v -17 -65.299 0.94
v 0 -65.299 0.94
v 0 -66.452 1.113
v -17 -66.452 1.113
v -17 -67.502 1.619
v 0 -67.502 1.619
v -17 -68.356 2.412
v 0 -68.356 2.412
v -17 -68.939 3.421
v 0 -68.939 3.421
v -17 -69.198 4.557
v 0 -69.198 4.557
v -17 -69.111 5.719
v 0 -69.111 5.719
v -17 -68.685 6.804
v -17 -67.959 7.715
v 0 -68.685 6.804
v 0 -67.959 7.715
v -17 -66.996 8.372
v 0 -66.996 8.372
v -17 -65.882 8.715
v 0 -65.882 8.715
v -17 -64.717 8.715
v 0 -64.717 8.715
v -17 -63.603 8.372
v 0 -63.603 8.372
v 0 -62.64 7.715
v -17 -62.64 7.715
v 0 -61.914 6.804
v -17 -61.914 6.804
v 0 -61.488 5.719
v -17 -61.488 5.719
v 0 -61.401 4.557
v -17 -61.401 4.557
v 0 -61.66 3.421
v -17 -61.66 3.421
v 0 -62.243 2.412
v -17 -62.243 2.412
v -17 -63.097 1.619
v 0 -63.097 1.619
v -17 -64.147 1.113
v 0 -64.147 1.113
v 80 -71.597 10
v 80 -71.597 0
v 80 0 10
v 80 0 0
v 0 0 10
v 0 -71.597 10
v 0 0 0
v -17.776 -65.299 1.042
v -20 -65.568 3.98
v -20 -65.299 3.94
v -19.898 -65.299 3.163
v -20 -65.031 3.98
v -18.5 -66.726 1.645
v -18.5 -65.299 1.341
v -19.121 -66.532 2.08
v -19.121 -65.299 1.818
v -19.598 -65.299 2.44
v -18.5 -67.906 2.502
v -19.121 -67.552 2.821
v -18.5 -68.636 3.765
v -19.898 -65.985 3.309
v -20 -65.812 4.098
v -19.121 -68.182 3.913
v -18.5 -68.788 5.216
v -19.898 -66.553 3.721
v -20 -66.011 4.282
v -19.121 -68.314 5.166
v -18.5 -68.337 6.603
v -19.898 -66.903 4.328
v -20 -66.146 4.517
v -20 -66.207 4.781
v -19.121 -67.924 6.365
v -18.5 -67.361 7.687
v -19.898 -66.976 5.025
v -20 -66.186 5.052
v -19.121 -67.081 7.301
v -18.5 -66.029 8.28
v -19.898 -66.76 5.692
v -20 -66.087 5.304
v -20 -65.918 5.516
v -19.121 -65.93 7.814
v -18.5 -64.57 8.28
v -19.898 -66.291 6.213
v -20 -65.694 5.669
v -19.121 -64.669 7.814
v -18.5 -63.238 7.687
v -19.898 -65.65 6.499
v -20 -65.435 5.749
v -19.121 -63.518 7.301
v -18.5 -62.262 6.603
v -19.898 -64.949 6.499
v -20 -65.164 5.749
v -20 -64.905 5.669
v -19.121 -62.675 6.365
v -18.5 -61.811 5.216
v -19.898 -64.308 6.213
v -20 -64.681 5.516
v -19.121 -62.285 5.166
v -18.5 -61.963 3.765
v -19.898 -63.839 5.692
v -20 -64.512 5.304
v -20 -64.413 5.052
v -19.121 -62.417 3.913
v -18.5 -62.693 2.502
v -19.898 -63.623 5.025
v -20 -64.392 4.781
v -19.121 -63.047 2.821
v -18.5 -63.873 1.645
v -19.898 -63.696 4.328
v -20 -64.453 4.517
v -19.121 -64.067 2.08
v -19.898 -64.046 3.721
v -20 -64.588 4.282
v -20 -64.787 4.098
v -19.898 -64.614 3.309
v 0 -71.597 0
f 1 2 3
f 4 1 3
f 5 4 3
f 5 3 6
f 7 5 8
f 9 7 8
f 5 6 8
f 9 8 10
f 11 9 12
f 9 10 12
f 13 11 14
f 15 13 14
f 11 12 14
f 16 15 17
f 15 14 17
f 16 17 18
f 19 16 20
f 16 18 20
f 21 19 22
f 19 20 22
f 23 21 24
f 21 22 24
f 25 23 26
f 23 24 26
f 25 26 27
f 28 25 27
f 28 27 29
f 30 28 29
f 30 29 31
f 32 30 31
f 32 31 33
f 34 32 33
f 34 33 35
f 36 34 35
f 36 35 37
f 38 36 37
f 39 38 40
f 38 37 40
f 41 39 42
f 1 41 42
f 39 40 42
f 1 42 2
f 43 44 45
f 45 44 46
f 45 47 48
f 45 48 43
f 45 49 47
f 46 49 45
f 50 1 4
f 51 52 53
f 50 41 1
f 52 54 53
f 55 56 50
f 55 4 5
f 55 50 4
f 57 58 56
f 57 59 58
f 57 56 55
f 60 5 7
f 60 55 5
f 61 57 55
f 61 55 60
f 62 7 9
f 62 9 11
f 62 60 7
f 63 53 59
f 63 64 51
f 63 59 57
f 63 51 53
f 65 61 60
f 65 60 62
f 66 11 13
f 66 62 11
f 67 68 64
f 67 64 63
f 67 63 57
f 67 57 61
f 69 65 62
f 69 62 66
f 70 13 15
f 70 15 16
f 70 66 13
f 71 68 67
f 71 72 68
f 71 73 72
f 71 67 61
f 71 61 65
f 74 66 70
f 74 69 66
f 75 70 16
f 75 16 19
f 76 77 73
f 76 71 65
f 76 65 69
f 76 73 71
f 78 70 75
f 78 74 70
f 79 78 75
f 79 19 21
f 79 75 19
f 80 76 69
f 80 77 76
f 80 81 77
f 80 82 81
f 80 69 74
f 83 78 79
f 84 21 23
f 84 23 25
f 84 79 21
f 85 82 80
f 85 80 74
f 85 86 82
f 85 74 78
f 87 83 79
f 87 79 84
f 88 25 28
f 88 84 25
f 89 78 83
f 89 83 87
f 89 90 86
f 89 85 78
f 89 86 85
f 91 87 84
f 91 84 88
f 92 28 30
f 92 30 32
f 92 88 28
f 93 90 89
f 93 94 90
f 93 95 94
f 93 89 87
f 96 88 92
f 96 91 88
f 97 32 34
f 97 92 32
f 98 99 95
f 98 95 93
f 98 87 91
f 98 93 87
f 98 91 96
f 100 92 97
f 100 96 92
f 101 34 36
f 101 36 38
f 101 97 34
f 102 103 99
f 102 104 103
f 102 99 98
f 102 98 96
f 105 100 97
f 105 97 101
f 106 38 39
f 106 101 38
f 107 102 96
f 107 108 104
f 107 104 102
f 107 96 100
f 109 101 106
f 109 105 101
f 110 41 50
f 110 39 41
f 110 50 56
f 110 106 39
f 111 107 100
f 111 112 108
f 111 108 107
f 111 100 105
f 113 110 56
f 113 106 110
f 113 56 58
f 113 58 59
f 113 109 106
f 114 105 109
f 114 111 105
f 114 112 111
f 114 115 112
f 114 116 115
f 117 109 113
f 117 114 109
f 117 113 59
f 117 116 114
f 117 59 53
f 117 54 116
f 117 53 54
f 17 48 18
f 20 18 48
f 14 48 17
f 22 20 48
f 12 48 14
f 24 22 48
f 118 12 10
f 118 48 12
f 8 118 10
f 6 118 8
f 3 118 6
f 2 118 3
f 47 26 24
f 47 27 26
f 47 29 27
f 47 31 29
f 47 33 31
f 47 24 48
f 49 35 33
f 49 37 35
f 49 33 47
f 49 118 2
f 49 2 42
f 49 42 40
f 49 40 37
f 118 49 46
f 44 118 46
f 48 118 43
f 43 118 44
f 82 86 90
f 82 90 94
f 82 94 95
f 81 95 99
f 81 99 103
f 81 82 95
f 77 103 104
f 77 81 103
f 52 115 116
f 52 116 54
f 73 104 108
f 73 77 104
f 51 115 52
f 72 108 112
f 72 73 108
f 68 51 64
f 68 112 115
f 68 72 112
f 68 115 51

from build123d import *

# Parameters (mm, degrees)
SKETCH1_W           = 80
SKETCH1_H           = 71.597374179
BOSS_EXTRUDE1_DEPTH = 10
SKETCH2_R           = 3.909711409
BOSS_EXTRUDE2_DEPTH = 20
FILLET1_R           = 3


with BuildPart() as part:
    # Sketch1 → Boss-Extrude1 (new body)
    with BuildSketch(Plane.XY):
        with Locations((40, -35.798687089)):
            Rectangle(SKETCH1_W, SKETCH1_H)
    extrude(amount=BOSS_EXTRUDE1_DEPTH)

    # Sketch2 → Boss-Extrude2 (add)
    with BuildSketch(Plane.ZY):
        with Locations(Location((4.849229458, -65.299456518, 0), (0, 0, 180))):
            Circle(SKETCH2_R)
    extrude(amount=BOSS_EXTRUDE2_DEPTH)

    # Fillet1
    fillet1_edges = [part.edges().sort_by_distance(p)[0] for p in [
        (-20, -65.299456518, 8.758940867),
    ]]
    fillet(fillet1_edges, radius=FILLET1_R)


solid = part.part
